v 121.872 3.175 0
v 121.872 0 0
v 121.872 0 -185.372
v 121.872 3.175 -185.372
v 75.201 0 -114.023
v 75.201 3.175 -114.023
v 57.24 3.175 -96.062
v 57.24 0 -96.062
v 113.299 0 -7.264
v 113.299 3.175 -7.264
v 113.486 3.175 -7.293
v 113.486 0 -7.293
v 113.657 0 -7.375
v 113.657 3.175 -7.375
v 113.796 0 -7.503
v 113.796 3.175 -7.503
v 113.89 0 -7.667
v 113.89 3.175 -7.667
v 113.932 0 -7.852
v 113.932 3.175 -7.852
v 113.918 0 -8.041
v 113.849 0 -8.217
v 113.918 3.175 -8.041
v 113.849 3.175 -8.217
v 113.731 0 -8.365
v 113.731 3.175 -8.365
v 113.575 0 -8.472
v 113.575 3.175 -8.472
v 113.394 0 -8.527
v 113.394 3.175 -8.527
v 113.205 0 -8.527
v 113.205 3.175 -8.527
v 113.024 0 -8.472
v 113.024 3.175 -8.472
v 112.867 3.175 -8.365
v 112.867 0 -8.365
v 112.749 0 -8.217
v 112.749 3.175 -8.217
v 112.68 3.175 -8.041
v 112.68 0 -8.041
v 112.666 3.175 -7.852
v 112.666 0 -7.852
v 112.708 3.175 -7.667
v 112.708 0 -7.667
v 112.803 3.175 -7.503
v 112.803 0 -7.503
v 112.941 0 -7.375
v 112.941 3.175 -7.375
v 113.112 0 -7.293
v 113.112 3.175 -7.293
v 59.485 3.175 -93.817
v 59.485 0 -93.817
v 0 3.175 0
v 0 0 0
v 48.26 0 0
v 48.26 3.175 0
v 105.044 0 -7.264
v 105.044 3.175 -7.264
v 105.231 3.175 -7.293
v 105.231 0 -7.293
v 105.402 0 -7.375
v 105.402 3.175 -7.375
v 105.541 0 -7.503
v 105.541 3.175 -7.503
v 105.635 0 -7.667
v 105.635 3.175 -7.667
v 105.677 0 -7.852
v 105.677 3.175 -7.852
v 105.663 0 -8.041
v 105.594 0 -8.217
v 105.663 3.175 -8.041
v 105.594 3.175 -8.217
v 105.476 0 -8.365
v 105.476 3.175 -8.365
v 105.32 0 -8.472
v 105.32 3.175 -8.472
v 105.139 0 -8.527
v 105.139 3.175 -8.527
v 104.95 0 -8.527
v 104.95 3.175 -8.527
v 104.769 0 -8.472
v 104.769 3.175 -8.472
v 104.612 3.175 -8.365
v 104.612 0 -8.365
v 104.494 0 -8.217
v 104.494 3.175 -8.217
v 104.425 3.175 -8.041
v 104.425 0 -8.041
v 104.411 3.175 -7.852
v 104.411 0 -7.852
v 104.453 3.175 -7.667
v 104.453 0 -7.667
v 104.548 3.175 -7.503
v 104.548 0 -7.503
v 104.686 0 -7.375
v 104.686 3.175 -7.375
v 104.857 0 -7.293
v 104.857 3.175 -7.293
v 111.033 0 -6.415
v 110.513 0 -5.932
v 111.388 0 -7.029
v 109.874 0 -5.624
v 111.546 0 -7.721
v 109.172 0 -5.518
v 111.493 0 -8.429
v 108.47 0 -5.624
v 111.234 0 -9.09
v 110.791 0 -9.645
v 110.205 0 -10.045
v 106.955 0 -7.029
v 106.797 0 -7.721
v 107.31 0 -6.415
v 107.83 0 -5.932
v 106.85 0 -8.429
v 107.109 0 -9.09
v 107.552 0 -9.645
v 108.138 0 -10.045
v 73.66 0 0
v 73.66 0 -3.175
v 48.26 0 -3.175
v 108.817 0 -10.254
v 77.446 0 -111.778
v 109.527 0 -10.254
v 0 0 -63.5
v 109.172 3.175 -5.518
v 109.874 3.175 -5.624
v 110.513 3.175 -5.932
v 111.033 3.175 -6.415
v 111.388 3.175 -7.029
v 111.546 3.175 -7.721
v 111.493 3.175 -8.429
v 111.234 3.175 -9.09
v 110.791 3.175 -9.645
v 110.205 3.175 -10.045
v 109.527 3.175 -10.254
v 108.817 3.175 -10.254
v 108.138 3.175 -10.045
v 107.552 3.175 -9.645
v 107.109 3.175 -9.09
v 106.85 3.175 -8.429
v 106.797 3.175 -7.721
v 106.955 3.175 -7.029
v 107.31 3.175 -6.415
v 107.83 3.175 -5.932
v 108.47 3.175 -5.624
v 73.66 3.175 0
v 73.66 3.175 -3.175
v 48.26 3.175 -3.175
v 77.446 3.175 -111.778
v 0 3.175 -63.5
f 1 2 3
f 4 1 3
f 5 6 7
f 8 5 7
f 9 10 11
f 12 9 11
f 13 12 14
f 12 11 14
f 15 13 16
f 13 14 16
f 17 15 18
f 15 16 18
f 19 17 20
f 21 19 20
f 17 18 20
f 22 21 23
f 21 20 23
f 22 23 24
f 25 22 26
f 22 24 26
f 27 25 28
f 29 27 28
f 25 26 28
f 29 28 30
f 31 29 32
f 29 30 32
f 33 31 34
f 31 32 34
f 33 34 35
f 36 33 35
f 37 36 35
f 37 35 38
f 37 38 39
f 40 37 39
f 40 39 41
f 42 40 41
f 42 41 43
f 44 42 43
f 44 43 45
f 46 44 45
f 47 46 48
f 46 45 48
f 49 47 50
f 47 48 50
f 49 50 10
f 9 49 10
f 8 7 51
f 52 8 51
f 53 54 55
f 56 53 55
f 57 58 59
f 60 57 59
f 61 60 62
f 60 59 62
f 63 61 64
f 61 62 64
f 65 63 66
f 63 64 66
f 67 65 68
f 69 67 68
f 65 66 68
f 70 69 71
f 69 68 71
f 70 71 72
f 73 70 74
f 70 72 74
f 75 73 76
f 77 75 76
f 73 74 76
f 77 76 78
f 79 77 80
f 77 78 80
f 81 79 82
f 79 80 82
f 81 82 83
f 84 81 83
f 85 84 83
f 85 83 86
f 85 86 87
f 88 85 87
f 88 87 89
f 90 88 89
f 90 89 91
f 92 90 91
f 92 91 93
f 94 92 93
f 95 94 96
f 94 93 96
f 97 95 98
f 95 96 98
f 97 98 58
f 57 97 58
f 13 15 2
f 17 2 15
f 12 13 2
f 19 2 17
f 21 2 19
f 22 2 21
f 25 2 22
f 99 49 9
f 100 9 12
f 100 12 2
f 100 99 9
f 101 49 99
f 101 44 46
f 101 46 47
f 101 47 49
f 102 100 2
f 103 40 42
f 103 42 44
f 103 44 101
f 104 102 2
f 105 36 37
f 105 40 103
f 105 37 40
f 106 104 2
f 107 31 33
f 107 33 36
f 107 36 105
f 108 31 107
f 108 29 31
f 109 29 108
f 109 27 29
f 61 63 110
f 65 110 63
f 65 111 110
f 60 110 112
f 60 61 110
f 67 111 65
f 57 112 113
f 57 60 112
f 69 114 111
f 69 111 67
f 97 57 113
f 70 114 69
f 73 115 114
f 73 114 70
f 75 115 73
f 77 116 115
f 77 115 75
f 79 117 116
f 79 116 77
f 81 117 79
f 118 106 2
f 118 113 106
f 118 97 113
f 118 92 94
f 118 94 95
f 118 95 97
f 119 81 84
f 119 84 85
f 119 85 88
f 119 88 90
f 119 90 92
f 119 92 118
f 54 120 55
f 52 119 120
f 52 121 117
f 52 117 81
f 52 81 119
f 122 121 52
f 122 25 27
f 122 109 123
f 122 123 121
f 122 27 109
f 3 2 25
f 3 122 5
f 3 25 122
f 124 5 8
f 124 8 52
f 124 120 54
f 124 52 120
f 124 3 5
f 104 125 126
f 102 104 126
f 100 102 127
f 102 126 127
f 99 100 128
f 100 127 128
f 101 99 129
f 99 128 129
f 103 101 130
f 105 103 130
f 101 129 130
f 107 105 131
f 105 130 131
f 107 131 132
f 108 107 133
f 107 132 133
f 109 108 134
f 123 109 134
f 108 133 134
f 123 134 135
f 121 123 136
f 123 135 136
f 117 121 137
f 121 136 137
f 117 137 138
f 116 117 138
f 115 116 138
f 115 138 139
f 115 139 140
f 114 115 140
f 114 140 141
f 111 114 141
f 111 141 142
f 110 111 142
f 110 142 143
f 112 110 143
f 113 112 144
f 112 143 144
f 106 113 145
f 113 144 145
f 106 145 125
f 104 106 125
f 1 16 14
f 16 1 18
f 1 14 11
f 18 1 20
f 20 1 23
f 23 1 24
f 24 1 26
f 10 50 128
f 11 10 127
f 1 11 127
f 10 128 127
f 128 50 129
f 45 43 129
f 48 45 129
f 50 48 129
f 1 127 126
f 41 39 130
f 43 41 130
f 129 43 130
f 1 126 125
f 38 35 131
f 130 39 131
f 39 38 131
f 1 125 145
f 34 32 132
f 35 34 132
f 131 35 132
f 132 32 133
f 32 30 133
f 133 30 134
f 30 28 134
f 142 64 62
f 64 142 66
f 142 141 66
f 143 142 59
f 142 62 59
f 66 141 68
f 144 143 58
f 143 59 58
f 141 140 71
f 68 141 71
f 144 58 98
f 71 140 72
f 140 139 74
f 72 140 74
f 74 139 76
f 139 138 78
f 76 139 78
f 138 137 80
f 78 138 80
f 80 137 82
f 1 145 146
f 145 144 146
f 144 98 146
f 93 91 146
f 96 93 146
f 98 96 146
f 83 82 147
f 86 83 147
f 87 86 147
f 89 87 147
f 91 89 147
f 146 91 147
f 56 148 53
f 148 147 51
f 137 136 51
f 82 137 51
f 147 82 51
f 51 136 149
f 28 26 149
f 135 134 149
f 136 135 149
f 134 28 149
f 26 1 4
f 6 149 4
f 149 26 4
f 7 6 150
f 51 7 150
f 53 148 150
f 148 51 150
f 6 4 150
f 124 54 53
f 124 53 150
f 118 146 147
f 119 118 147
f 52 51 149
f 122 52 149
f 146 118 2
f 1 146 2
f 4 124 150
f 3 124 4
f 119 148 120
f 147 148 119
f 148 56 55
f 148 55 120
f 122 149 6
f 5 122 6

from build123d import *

# Parameters (mm, degrees)
BOSS_EXTRUDE1_DEPTH = 3.175
SKETCH2_R           = 2.38125
SKETCH2_R_2         = 0.635
SKETCH2_W           = 25.4
SKETCH2_H           = 3.175
CUT_EXTRUDE1_DEPTH  = 3.175


with BuildPart() as part:
    # Sketch1 → Boss-Extrude1 (new body)
    with BuildSketch(Plane(origin=(0, 0, 0), x_dir=(1, 0, 0), z_dir=(0, 1, 0))):
        Polygon((0, 63.5), (121.871664787, 185.371664787), (121.871664787, 121.549227353), (121.871664787, 0), (63.5, 0), (31.75, 0), (0, 0), align=None)
    extrude(amount=BOSS_EXTRUDE1_DEPTH)

    # Sketch2 → Cut-Extrude1 (cut)
    with BuildSketch(Plane(origin=(0, 3.175, 0), x_dir=(1, 0, 0), z_dir=(0, 1, 0))):
        with Locations(Location((109.171664787, 7.8994, 0), (0, 0, 270))):
            Circle(SKETCH2_R)
        with Locations(Location((105.044164787, 7.8994, 0), (0, 0, 270))):
            Circle(SKETCH2_R_2)
        with Locations(Location((113.299164787, 7.8994, 0), (0, 0, 270))):
            Circle(SKETCH2_R_2)
        Polygon((57.240266841, 96.06229437), (59.485330871, 93.81723034), (77.445843113, 111.777742582), (75.200779083, 114.022806612), align=None)
        with Locations((60.96, 1.5875)):
            Rectangle(SKETCH2_W, SKETCH2_H)
    extrude(amount=-CUT_EXTRUDE1_DEPTH, mode=Mode.SUBTRACT)


solid = part.part
